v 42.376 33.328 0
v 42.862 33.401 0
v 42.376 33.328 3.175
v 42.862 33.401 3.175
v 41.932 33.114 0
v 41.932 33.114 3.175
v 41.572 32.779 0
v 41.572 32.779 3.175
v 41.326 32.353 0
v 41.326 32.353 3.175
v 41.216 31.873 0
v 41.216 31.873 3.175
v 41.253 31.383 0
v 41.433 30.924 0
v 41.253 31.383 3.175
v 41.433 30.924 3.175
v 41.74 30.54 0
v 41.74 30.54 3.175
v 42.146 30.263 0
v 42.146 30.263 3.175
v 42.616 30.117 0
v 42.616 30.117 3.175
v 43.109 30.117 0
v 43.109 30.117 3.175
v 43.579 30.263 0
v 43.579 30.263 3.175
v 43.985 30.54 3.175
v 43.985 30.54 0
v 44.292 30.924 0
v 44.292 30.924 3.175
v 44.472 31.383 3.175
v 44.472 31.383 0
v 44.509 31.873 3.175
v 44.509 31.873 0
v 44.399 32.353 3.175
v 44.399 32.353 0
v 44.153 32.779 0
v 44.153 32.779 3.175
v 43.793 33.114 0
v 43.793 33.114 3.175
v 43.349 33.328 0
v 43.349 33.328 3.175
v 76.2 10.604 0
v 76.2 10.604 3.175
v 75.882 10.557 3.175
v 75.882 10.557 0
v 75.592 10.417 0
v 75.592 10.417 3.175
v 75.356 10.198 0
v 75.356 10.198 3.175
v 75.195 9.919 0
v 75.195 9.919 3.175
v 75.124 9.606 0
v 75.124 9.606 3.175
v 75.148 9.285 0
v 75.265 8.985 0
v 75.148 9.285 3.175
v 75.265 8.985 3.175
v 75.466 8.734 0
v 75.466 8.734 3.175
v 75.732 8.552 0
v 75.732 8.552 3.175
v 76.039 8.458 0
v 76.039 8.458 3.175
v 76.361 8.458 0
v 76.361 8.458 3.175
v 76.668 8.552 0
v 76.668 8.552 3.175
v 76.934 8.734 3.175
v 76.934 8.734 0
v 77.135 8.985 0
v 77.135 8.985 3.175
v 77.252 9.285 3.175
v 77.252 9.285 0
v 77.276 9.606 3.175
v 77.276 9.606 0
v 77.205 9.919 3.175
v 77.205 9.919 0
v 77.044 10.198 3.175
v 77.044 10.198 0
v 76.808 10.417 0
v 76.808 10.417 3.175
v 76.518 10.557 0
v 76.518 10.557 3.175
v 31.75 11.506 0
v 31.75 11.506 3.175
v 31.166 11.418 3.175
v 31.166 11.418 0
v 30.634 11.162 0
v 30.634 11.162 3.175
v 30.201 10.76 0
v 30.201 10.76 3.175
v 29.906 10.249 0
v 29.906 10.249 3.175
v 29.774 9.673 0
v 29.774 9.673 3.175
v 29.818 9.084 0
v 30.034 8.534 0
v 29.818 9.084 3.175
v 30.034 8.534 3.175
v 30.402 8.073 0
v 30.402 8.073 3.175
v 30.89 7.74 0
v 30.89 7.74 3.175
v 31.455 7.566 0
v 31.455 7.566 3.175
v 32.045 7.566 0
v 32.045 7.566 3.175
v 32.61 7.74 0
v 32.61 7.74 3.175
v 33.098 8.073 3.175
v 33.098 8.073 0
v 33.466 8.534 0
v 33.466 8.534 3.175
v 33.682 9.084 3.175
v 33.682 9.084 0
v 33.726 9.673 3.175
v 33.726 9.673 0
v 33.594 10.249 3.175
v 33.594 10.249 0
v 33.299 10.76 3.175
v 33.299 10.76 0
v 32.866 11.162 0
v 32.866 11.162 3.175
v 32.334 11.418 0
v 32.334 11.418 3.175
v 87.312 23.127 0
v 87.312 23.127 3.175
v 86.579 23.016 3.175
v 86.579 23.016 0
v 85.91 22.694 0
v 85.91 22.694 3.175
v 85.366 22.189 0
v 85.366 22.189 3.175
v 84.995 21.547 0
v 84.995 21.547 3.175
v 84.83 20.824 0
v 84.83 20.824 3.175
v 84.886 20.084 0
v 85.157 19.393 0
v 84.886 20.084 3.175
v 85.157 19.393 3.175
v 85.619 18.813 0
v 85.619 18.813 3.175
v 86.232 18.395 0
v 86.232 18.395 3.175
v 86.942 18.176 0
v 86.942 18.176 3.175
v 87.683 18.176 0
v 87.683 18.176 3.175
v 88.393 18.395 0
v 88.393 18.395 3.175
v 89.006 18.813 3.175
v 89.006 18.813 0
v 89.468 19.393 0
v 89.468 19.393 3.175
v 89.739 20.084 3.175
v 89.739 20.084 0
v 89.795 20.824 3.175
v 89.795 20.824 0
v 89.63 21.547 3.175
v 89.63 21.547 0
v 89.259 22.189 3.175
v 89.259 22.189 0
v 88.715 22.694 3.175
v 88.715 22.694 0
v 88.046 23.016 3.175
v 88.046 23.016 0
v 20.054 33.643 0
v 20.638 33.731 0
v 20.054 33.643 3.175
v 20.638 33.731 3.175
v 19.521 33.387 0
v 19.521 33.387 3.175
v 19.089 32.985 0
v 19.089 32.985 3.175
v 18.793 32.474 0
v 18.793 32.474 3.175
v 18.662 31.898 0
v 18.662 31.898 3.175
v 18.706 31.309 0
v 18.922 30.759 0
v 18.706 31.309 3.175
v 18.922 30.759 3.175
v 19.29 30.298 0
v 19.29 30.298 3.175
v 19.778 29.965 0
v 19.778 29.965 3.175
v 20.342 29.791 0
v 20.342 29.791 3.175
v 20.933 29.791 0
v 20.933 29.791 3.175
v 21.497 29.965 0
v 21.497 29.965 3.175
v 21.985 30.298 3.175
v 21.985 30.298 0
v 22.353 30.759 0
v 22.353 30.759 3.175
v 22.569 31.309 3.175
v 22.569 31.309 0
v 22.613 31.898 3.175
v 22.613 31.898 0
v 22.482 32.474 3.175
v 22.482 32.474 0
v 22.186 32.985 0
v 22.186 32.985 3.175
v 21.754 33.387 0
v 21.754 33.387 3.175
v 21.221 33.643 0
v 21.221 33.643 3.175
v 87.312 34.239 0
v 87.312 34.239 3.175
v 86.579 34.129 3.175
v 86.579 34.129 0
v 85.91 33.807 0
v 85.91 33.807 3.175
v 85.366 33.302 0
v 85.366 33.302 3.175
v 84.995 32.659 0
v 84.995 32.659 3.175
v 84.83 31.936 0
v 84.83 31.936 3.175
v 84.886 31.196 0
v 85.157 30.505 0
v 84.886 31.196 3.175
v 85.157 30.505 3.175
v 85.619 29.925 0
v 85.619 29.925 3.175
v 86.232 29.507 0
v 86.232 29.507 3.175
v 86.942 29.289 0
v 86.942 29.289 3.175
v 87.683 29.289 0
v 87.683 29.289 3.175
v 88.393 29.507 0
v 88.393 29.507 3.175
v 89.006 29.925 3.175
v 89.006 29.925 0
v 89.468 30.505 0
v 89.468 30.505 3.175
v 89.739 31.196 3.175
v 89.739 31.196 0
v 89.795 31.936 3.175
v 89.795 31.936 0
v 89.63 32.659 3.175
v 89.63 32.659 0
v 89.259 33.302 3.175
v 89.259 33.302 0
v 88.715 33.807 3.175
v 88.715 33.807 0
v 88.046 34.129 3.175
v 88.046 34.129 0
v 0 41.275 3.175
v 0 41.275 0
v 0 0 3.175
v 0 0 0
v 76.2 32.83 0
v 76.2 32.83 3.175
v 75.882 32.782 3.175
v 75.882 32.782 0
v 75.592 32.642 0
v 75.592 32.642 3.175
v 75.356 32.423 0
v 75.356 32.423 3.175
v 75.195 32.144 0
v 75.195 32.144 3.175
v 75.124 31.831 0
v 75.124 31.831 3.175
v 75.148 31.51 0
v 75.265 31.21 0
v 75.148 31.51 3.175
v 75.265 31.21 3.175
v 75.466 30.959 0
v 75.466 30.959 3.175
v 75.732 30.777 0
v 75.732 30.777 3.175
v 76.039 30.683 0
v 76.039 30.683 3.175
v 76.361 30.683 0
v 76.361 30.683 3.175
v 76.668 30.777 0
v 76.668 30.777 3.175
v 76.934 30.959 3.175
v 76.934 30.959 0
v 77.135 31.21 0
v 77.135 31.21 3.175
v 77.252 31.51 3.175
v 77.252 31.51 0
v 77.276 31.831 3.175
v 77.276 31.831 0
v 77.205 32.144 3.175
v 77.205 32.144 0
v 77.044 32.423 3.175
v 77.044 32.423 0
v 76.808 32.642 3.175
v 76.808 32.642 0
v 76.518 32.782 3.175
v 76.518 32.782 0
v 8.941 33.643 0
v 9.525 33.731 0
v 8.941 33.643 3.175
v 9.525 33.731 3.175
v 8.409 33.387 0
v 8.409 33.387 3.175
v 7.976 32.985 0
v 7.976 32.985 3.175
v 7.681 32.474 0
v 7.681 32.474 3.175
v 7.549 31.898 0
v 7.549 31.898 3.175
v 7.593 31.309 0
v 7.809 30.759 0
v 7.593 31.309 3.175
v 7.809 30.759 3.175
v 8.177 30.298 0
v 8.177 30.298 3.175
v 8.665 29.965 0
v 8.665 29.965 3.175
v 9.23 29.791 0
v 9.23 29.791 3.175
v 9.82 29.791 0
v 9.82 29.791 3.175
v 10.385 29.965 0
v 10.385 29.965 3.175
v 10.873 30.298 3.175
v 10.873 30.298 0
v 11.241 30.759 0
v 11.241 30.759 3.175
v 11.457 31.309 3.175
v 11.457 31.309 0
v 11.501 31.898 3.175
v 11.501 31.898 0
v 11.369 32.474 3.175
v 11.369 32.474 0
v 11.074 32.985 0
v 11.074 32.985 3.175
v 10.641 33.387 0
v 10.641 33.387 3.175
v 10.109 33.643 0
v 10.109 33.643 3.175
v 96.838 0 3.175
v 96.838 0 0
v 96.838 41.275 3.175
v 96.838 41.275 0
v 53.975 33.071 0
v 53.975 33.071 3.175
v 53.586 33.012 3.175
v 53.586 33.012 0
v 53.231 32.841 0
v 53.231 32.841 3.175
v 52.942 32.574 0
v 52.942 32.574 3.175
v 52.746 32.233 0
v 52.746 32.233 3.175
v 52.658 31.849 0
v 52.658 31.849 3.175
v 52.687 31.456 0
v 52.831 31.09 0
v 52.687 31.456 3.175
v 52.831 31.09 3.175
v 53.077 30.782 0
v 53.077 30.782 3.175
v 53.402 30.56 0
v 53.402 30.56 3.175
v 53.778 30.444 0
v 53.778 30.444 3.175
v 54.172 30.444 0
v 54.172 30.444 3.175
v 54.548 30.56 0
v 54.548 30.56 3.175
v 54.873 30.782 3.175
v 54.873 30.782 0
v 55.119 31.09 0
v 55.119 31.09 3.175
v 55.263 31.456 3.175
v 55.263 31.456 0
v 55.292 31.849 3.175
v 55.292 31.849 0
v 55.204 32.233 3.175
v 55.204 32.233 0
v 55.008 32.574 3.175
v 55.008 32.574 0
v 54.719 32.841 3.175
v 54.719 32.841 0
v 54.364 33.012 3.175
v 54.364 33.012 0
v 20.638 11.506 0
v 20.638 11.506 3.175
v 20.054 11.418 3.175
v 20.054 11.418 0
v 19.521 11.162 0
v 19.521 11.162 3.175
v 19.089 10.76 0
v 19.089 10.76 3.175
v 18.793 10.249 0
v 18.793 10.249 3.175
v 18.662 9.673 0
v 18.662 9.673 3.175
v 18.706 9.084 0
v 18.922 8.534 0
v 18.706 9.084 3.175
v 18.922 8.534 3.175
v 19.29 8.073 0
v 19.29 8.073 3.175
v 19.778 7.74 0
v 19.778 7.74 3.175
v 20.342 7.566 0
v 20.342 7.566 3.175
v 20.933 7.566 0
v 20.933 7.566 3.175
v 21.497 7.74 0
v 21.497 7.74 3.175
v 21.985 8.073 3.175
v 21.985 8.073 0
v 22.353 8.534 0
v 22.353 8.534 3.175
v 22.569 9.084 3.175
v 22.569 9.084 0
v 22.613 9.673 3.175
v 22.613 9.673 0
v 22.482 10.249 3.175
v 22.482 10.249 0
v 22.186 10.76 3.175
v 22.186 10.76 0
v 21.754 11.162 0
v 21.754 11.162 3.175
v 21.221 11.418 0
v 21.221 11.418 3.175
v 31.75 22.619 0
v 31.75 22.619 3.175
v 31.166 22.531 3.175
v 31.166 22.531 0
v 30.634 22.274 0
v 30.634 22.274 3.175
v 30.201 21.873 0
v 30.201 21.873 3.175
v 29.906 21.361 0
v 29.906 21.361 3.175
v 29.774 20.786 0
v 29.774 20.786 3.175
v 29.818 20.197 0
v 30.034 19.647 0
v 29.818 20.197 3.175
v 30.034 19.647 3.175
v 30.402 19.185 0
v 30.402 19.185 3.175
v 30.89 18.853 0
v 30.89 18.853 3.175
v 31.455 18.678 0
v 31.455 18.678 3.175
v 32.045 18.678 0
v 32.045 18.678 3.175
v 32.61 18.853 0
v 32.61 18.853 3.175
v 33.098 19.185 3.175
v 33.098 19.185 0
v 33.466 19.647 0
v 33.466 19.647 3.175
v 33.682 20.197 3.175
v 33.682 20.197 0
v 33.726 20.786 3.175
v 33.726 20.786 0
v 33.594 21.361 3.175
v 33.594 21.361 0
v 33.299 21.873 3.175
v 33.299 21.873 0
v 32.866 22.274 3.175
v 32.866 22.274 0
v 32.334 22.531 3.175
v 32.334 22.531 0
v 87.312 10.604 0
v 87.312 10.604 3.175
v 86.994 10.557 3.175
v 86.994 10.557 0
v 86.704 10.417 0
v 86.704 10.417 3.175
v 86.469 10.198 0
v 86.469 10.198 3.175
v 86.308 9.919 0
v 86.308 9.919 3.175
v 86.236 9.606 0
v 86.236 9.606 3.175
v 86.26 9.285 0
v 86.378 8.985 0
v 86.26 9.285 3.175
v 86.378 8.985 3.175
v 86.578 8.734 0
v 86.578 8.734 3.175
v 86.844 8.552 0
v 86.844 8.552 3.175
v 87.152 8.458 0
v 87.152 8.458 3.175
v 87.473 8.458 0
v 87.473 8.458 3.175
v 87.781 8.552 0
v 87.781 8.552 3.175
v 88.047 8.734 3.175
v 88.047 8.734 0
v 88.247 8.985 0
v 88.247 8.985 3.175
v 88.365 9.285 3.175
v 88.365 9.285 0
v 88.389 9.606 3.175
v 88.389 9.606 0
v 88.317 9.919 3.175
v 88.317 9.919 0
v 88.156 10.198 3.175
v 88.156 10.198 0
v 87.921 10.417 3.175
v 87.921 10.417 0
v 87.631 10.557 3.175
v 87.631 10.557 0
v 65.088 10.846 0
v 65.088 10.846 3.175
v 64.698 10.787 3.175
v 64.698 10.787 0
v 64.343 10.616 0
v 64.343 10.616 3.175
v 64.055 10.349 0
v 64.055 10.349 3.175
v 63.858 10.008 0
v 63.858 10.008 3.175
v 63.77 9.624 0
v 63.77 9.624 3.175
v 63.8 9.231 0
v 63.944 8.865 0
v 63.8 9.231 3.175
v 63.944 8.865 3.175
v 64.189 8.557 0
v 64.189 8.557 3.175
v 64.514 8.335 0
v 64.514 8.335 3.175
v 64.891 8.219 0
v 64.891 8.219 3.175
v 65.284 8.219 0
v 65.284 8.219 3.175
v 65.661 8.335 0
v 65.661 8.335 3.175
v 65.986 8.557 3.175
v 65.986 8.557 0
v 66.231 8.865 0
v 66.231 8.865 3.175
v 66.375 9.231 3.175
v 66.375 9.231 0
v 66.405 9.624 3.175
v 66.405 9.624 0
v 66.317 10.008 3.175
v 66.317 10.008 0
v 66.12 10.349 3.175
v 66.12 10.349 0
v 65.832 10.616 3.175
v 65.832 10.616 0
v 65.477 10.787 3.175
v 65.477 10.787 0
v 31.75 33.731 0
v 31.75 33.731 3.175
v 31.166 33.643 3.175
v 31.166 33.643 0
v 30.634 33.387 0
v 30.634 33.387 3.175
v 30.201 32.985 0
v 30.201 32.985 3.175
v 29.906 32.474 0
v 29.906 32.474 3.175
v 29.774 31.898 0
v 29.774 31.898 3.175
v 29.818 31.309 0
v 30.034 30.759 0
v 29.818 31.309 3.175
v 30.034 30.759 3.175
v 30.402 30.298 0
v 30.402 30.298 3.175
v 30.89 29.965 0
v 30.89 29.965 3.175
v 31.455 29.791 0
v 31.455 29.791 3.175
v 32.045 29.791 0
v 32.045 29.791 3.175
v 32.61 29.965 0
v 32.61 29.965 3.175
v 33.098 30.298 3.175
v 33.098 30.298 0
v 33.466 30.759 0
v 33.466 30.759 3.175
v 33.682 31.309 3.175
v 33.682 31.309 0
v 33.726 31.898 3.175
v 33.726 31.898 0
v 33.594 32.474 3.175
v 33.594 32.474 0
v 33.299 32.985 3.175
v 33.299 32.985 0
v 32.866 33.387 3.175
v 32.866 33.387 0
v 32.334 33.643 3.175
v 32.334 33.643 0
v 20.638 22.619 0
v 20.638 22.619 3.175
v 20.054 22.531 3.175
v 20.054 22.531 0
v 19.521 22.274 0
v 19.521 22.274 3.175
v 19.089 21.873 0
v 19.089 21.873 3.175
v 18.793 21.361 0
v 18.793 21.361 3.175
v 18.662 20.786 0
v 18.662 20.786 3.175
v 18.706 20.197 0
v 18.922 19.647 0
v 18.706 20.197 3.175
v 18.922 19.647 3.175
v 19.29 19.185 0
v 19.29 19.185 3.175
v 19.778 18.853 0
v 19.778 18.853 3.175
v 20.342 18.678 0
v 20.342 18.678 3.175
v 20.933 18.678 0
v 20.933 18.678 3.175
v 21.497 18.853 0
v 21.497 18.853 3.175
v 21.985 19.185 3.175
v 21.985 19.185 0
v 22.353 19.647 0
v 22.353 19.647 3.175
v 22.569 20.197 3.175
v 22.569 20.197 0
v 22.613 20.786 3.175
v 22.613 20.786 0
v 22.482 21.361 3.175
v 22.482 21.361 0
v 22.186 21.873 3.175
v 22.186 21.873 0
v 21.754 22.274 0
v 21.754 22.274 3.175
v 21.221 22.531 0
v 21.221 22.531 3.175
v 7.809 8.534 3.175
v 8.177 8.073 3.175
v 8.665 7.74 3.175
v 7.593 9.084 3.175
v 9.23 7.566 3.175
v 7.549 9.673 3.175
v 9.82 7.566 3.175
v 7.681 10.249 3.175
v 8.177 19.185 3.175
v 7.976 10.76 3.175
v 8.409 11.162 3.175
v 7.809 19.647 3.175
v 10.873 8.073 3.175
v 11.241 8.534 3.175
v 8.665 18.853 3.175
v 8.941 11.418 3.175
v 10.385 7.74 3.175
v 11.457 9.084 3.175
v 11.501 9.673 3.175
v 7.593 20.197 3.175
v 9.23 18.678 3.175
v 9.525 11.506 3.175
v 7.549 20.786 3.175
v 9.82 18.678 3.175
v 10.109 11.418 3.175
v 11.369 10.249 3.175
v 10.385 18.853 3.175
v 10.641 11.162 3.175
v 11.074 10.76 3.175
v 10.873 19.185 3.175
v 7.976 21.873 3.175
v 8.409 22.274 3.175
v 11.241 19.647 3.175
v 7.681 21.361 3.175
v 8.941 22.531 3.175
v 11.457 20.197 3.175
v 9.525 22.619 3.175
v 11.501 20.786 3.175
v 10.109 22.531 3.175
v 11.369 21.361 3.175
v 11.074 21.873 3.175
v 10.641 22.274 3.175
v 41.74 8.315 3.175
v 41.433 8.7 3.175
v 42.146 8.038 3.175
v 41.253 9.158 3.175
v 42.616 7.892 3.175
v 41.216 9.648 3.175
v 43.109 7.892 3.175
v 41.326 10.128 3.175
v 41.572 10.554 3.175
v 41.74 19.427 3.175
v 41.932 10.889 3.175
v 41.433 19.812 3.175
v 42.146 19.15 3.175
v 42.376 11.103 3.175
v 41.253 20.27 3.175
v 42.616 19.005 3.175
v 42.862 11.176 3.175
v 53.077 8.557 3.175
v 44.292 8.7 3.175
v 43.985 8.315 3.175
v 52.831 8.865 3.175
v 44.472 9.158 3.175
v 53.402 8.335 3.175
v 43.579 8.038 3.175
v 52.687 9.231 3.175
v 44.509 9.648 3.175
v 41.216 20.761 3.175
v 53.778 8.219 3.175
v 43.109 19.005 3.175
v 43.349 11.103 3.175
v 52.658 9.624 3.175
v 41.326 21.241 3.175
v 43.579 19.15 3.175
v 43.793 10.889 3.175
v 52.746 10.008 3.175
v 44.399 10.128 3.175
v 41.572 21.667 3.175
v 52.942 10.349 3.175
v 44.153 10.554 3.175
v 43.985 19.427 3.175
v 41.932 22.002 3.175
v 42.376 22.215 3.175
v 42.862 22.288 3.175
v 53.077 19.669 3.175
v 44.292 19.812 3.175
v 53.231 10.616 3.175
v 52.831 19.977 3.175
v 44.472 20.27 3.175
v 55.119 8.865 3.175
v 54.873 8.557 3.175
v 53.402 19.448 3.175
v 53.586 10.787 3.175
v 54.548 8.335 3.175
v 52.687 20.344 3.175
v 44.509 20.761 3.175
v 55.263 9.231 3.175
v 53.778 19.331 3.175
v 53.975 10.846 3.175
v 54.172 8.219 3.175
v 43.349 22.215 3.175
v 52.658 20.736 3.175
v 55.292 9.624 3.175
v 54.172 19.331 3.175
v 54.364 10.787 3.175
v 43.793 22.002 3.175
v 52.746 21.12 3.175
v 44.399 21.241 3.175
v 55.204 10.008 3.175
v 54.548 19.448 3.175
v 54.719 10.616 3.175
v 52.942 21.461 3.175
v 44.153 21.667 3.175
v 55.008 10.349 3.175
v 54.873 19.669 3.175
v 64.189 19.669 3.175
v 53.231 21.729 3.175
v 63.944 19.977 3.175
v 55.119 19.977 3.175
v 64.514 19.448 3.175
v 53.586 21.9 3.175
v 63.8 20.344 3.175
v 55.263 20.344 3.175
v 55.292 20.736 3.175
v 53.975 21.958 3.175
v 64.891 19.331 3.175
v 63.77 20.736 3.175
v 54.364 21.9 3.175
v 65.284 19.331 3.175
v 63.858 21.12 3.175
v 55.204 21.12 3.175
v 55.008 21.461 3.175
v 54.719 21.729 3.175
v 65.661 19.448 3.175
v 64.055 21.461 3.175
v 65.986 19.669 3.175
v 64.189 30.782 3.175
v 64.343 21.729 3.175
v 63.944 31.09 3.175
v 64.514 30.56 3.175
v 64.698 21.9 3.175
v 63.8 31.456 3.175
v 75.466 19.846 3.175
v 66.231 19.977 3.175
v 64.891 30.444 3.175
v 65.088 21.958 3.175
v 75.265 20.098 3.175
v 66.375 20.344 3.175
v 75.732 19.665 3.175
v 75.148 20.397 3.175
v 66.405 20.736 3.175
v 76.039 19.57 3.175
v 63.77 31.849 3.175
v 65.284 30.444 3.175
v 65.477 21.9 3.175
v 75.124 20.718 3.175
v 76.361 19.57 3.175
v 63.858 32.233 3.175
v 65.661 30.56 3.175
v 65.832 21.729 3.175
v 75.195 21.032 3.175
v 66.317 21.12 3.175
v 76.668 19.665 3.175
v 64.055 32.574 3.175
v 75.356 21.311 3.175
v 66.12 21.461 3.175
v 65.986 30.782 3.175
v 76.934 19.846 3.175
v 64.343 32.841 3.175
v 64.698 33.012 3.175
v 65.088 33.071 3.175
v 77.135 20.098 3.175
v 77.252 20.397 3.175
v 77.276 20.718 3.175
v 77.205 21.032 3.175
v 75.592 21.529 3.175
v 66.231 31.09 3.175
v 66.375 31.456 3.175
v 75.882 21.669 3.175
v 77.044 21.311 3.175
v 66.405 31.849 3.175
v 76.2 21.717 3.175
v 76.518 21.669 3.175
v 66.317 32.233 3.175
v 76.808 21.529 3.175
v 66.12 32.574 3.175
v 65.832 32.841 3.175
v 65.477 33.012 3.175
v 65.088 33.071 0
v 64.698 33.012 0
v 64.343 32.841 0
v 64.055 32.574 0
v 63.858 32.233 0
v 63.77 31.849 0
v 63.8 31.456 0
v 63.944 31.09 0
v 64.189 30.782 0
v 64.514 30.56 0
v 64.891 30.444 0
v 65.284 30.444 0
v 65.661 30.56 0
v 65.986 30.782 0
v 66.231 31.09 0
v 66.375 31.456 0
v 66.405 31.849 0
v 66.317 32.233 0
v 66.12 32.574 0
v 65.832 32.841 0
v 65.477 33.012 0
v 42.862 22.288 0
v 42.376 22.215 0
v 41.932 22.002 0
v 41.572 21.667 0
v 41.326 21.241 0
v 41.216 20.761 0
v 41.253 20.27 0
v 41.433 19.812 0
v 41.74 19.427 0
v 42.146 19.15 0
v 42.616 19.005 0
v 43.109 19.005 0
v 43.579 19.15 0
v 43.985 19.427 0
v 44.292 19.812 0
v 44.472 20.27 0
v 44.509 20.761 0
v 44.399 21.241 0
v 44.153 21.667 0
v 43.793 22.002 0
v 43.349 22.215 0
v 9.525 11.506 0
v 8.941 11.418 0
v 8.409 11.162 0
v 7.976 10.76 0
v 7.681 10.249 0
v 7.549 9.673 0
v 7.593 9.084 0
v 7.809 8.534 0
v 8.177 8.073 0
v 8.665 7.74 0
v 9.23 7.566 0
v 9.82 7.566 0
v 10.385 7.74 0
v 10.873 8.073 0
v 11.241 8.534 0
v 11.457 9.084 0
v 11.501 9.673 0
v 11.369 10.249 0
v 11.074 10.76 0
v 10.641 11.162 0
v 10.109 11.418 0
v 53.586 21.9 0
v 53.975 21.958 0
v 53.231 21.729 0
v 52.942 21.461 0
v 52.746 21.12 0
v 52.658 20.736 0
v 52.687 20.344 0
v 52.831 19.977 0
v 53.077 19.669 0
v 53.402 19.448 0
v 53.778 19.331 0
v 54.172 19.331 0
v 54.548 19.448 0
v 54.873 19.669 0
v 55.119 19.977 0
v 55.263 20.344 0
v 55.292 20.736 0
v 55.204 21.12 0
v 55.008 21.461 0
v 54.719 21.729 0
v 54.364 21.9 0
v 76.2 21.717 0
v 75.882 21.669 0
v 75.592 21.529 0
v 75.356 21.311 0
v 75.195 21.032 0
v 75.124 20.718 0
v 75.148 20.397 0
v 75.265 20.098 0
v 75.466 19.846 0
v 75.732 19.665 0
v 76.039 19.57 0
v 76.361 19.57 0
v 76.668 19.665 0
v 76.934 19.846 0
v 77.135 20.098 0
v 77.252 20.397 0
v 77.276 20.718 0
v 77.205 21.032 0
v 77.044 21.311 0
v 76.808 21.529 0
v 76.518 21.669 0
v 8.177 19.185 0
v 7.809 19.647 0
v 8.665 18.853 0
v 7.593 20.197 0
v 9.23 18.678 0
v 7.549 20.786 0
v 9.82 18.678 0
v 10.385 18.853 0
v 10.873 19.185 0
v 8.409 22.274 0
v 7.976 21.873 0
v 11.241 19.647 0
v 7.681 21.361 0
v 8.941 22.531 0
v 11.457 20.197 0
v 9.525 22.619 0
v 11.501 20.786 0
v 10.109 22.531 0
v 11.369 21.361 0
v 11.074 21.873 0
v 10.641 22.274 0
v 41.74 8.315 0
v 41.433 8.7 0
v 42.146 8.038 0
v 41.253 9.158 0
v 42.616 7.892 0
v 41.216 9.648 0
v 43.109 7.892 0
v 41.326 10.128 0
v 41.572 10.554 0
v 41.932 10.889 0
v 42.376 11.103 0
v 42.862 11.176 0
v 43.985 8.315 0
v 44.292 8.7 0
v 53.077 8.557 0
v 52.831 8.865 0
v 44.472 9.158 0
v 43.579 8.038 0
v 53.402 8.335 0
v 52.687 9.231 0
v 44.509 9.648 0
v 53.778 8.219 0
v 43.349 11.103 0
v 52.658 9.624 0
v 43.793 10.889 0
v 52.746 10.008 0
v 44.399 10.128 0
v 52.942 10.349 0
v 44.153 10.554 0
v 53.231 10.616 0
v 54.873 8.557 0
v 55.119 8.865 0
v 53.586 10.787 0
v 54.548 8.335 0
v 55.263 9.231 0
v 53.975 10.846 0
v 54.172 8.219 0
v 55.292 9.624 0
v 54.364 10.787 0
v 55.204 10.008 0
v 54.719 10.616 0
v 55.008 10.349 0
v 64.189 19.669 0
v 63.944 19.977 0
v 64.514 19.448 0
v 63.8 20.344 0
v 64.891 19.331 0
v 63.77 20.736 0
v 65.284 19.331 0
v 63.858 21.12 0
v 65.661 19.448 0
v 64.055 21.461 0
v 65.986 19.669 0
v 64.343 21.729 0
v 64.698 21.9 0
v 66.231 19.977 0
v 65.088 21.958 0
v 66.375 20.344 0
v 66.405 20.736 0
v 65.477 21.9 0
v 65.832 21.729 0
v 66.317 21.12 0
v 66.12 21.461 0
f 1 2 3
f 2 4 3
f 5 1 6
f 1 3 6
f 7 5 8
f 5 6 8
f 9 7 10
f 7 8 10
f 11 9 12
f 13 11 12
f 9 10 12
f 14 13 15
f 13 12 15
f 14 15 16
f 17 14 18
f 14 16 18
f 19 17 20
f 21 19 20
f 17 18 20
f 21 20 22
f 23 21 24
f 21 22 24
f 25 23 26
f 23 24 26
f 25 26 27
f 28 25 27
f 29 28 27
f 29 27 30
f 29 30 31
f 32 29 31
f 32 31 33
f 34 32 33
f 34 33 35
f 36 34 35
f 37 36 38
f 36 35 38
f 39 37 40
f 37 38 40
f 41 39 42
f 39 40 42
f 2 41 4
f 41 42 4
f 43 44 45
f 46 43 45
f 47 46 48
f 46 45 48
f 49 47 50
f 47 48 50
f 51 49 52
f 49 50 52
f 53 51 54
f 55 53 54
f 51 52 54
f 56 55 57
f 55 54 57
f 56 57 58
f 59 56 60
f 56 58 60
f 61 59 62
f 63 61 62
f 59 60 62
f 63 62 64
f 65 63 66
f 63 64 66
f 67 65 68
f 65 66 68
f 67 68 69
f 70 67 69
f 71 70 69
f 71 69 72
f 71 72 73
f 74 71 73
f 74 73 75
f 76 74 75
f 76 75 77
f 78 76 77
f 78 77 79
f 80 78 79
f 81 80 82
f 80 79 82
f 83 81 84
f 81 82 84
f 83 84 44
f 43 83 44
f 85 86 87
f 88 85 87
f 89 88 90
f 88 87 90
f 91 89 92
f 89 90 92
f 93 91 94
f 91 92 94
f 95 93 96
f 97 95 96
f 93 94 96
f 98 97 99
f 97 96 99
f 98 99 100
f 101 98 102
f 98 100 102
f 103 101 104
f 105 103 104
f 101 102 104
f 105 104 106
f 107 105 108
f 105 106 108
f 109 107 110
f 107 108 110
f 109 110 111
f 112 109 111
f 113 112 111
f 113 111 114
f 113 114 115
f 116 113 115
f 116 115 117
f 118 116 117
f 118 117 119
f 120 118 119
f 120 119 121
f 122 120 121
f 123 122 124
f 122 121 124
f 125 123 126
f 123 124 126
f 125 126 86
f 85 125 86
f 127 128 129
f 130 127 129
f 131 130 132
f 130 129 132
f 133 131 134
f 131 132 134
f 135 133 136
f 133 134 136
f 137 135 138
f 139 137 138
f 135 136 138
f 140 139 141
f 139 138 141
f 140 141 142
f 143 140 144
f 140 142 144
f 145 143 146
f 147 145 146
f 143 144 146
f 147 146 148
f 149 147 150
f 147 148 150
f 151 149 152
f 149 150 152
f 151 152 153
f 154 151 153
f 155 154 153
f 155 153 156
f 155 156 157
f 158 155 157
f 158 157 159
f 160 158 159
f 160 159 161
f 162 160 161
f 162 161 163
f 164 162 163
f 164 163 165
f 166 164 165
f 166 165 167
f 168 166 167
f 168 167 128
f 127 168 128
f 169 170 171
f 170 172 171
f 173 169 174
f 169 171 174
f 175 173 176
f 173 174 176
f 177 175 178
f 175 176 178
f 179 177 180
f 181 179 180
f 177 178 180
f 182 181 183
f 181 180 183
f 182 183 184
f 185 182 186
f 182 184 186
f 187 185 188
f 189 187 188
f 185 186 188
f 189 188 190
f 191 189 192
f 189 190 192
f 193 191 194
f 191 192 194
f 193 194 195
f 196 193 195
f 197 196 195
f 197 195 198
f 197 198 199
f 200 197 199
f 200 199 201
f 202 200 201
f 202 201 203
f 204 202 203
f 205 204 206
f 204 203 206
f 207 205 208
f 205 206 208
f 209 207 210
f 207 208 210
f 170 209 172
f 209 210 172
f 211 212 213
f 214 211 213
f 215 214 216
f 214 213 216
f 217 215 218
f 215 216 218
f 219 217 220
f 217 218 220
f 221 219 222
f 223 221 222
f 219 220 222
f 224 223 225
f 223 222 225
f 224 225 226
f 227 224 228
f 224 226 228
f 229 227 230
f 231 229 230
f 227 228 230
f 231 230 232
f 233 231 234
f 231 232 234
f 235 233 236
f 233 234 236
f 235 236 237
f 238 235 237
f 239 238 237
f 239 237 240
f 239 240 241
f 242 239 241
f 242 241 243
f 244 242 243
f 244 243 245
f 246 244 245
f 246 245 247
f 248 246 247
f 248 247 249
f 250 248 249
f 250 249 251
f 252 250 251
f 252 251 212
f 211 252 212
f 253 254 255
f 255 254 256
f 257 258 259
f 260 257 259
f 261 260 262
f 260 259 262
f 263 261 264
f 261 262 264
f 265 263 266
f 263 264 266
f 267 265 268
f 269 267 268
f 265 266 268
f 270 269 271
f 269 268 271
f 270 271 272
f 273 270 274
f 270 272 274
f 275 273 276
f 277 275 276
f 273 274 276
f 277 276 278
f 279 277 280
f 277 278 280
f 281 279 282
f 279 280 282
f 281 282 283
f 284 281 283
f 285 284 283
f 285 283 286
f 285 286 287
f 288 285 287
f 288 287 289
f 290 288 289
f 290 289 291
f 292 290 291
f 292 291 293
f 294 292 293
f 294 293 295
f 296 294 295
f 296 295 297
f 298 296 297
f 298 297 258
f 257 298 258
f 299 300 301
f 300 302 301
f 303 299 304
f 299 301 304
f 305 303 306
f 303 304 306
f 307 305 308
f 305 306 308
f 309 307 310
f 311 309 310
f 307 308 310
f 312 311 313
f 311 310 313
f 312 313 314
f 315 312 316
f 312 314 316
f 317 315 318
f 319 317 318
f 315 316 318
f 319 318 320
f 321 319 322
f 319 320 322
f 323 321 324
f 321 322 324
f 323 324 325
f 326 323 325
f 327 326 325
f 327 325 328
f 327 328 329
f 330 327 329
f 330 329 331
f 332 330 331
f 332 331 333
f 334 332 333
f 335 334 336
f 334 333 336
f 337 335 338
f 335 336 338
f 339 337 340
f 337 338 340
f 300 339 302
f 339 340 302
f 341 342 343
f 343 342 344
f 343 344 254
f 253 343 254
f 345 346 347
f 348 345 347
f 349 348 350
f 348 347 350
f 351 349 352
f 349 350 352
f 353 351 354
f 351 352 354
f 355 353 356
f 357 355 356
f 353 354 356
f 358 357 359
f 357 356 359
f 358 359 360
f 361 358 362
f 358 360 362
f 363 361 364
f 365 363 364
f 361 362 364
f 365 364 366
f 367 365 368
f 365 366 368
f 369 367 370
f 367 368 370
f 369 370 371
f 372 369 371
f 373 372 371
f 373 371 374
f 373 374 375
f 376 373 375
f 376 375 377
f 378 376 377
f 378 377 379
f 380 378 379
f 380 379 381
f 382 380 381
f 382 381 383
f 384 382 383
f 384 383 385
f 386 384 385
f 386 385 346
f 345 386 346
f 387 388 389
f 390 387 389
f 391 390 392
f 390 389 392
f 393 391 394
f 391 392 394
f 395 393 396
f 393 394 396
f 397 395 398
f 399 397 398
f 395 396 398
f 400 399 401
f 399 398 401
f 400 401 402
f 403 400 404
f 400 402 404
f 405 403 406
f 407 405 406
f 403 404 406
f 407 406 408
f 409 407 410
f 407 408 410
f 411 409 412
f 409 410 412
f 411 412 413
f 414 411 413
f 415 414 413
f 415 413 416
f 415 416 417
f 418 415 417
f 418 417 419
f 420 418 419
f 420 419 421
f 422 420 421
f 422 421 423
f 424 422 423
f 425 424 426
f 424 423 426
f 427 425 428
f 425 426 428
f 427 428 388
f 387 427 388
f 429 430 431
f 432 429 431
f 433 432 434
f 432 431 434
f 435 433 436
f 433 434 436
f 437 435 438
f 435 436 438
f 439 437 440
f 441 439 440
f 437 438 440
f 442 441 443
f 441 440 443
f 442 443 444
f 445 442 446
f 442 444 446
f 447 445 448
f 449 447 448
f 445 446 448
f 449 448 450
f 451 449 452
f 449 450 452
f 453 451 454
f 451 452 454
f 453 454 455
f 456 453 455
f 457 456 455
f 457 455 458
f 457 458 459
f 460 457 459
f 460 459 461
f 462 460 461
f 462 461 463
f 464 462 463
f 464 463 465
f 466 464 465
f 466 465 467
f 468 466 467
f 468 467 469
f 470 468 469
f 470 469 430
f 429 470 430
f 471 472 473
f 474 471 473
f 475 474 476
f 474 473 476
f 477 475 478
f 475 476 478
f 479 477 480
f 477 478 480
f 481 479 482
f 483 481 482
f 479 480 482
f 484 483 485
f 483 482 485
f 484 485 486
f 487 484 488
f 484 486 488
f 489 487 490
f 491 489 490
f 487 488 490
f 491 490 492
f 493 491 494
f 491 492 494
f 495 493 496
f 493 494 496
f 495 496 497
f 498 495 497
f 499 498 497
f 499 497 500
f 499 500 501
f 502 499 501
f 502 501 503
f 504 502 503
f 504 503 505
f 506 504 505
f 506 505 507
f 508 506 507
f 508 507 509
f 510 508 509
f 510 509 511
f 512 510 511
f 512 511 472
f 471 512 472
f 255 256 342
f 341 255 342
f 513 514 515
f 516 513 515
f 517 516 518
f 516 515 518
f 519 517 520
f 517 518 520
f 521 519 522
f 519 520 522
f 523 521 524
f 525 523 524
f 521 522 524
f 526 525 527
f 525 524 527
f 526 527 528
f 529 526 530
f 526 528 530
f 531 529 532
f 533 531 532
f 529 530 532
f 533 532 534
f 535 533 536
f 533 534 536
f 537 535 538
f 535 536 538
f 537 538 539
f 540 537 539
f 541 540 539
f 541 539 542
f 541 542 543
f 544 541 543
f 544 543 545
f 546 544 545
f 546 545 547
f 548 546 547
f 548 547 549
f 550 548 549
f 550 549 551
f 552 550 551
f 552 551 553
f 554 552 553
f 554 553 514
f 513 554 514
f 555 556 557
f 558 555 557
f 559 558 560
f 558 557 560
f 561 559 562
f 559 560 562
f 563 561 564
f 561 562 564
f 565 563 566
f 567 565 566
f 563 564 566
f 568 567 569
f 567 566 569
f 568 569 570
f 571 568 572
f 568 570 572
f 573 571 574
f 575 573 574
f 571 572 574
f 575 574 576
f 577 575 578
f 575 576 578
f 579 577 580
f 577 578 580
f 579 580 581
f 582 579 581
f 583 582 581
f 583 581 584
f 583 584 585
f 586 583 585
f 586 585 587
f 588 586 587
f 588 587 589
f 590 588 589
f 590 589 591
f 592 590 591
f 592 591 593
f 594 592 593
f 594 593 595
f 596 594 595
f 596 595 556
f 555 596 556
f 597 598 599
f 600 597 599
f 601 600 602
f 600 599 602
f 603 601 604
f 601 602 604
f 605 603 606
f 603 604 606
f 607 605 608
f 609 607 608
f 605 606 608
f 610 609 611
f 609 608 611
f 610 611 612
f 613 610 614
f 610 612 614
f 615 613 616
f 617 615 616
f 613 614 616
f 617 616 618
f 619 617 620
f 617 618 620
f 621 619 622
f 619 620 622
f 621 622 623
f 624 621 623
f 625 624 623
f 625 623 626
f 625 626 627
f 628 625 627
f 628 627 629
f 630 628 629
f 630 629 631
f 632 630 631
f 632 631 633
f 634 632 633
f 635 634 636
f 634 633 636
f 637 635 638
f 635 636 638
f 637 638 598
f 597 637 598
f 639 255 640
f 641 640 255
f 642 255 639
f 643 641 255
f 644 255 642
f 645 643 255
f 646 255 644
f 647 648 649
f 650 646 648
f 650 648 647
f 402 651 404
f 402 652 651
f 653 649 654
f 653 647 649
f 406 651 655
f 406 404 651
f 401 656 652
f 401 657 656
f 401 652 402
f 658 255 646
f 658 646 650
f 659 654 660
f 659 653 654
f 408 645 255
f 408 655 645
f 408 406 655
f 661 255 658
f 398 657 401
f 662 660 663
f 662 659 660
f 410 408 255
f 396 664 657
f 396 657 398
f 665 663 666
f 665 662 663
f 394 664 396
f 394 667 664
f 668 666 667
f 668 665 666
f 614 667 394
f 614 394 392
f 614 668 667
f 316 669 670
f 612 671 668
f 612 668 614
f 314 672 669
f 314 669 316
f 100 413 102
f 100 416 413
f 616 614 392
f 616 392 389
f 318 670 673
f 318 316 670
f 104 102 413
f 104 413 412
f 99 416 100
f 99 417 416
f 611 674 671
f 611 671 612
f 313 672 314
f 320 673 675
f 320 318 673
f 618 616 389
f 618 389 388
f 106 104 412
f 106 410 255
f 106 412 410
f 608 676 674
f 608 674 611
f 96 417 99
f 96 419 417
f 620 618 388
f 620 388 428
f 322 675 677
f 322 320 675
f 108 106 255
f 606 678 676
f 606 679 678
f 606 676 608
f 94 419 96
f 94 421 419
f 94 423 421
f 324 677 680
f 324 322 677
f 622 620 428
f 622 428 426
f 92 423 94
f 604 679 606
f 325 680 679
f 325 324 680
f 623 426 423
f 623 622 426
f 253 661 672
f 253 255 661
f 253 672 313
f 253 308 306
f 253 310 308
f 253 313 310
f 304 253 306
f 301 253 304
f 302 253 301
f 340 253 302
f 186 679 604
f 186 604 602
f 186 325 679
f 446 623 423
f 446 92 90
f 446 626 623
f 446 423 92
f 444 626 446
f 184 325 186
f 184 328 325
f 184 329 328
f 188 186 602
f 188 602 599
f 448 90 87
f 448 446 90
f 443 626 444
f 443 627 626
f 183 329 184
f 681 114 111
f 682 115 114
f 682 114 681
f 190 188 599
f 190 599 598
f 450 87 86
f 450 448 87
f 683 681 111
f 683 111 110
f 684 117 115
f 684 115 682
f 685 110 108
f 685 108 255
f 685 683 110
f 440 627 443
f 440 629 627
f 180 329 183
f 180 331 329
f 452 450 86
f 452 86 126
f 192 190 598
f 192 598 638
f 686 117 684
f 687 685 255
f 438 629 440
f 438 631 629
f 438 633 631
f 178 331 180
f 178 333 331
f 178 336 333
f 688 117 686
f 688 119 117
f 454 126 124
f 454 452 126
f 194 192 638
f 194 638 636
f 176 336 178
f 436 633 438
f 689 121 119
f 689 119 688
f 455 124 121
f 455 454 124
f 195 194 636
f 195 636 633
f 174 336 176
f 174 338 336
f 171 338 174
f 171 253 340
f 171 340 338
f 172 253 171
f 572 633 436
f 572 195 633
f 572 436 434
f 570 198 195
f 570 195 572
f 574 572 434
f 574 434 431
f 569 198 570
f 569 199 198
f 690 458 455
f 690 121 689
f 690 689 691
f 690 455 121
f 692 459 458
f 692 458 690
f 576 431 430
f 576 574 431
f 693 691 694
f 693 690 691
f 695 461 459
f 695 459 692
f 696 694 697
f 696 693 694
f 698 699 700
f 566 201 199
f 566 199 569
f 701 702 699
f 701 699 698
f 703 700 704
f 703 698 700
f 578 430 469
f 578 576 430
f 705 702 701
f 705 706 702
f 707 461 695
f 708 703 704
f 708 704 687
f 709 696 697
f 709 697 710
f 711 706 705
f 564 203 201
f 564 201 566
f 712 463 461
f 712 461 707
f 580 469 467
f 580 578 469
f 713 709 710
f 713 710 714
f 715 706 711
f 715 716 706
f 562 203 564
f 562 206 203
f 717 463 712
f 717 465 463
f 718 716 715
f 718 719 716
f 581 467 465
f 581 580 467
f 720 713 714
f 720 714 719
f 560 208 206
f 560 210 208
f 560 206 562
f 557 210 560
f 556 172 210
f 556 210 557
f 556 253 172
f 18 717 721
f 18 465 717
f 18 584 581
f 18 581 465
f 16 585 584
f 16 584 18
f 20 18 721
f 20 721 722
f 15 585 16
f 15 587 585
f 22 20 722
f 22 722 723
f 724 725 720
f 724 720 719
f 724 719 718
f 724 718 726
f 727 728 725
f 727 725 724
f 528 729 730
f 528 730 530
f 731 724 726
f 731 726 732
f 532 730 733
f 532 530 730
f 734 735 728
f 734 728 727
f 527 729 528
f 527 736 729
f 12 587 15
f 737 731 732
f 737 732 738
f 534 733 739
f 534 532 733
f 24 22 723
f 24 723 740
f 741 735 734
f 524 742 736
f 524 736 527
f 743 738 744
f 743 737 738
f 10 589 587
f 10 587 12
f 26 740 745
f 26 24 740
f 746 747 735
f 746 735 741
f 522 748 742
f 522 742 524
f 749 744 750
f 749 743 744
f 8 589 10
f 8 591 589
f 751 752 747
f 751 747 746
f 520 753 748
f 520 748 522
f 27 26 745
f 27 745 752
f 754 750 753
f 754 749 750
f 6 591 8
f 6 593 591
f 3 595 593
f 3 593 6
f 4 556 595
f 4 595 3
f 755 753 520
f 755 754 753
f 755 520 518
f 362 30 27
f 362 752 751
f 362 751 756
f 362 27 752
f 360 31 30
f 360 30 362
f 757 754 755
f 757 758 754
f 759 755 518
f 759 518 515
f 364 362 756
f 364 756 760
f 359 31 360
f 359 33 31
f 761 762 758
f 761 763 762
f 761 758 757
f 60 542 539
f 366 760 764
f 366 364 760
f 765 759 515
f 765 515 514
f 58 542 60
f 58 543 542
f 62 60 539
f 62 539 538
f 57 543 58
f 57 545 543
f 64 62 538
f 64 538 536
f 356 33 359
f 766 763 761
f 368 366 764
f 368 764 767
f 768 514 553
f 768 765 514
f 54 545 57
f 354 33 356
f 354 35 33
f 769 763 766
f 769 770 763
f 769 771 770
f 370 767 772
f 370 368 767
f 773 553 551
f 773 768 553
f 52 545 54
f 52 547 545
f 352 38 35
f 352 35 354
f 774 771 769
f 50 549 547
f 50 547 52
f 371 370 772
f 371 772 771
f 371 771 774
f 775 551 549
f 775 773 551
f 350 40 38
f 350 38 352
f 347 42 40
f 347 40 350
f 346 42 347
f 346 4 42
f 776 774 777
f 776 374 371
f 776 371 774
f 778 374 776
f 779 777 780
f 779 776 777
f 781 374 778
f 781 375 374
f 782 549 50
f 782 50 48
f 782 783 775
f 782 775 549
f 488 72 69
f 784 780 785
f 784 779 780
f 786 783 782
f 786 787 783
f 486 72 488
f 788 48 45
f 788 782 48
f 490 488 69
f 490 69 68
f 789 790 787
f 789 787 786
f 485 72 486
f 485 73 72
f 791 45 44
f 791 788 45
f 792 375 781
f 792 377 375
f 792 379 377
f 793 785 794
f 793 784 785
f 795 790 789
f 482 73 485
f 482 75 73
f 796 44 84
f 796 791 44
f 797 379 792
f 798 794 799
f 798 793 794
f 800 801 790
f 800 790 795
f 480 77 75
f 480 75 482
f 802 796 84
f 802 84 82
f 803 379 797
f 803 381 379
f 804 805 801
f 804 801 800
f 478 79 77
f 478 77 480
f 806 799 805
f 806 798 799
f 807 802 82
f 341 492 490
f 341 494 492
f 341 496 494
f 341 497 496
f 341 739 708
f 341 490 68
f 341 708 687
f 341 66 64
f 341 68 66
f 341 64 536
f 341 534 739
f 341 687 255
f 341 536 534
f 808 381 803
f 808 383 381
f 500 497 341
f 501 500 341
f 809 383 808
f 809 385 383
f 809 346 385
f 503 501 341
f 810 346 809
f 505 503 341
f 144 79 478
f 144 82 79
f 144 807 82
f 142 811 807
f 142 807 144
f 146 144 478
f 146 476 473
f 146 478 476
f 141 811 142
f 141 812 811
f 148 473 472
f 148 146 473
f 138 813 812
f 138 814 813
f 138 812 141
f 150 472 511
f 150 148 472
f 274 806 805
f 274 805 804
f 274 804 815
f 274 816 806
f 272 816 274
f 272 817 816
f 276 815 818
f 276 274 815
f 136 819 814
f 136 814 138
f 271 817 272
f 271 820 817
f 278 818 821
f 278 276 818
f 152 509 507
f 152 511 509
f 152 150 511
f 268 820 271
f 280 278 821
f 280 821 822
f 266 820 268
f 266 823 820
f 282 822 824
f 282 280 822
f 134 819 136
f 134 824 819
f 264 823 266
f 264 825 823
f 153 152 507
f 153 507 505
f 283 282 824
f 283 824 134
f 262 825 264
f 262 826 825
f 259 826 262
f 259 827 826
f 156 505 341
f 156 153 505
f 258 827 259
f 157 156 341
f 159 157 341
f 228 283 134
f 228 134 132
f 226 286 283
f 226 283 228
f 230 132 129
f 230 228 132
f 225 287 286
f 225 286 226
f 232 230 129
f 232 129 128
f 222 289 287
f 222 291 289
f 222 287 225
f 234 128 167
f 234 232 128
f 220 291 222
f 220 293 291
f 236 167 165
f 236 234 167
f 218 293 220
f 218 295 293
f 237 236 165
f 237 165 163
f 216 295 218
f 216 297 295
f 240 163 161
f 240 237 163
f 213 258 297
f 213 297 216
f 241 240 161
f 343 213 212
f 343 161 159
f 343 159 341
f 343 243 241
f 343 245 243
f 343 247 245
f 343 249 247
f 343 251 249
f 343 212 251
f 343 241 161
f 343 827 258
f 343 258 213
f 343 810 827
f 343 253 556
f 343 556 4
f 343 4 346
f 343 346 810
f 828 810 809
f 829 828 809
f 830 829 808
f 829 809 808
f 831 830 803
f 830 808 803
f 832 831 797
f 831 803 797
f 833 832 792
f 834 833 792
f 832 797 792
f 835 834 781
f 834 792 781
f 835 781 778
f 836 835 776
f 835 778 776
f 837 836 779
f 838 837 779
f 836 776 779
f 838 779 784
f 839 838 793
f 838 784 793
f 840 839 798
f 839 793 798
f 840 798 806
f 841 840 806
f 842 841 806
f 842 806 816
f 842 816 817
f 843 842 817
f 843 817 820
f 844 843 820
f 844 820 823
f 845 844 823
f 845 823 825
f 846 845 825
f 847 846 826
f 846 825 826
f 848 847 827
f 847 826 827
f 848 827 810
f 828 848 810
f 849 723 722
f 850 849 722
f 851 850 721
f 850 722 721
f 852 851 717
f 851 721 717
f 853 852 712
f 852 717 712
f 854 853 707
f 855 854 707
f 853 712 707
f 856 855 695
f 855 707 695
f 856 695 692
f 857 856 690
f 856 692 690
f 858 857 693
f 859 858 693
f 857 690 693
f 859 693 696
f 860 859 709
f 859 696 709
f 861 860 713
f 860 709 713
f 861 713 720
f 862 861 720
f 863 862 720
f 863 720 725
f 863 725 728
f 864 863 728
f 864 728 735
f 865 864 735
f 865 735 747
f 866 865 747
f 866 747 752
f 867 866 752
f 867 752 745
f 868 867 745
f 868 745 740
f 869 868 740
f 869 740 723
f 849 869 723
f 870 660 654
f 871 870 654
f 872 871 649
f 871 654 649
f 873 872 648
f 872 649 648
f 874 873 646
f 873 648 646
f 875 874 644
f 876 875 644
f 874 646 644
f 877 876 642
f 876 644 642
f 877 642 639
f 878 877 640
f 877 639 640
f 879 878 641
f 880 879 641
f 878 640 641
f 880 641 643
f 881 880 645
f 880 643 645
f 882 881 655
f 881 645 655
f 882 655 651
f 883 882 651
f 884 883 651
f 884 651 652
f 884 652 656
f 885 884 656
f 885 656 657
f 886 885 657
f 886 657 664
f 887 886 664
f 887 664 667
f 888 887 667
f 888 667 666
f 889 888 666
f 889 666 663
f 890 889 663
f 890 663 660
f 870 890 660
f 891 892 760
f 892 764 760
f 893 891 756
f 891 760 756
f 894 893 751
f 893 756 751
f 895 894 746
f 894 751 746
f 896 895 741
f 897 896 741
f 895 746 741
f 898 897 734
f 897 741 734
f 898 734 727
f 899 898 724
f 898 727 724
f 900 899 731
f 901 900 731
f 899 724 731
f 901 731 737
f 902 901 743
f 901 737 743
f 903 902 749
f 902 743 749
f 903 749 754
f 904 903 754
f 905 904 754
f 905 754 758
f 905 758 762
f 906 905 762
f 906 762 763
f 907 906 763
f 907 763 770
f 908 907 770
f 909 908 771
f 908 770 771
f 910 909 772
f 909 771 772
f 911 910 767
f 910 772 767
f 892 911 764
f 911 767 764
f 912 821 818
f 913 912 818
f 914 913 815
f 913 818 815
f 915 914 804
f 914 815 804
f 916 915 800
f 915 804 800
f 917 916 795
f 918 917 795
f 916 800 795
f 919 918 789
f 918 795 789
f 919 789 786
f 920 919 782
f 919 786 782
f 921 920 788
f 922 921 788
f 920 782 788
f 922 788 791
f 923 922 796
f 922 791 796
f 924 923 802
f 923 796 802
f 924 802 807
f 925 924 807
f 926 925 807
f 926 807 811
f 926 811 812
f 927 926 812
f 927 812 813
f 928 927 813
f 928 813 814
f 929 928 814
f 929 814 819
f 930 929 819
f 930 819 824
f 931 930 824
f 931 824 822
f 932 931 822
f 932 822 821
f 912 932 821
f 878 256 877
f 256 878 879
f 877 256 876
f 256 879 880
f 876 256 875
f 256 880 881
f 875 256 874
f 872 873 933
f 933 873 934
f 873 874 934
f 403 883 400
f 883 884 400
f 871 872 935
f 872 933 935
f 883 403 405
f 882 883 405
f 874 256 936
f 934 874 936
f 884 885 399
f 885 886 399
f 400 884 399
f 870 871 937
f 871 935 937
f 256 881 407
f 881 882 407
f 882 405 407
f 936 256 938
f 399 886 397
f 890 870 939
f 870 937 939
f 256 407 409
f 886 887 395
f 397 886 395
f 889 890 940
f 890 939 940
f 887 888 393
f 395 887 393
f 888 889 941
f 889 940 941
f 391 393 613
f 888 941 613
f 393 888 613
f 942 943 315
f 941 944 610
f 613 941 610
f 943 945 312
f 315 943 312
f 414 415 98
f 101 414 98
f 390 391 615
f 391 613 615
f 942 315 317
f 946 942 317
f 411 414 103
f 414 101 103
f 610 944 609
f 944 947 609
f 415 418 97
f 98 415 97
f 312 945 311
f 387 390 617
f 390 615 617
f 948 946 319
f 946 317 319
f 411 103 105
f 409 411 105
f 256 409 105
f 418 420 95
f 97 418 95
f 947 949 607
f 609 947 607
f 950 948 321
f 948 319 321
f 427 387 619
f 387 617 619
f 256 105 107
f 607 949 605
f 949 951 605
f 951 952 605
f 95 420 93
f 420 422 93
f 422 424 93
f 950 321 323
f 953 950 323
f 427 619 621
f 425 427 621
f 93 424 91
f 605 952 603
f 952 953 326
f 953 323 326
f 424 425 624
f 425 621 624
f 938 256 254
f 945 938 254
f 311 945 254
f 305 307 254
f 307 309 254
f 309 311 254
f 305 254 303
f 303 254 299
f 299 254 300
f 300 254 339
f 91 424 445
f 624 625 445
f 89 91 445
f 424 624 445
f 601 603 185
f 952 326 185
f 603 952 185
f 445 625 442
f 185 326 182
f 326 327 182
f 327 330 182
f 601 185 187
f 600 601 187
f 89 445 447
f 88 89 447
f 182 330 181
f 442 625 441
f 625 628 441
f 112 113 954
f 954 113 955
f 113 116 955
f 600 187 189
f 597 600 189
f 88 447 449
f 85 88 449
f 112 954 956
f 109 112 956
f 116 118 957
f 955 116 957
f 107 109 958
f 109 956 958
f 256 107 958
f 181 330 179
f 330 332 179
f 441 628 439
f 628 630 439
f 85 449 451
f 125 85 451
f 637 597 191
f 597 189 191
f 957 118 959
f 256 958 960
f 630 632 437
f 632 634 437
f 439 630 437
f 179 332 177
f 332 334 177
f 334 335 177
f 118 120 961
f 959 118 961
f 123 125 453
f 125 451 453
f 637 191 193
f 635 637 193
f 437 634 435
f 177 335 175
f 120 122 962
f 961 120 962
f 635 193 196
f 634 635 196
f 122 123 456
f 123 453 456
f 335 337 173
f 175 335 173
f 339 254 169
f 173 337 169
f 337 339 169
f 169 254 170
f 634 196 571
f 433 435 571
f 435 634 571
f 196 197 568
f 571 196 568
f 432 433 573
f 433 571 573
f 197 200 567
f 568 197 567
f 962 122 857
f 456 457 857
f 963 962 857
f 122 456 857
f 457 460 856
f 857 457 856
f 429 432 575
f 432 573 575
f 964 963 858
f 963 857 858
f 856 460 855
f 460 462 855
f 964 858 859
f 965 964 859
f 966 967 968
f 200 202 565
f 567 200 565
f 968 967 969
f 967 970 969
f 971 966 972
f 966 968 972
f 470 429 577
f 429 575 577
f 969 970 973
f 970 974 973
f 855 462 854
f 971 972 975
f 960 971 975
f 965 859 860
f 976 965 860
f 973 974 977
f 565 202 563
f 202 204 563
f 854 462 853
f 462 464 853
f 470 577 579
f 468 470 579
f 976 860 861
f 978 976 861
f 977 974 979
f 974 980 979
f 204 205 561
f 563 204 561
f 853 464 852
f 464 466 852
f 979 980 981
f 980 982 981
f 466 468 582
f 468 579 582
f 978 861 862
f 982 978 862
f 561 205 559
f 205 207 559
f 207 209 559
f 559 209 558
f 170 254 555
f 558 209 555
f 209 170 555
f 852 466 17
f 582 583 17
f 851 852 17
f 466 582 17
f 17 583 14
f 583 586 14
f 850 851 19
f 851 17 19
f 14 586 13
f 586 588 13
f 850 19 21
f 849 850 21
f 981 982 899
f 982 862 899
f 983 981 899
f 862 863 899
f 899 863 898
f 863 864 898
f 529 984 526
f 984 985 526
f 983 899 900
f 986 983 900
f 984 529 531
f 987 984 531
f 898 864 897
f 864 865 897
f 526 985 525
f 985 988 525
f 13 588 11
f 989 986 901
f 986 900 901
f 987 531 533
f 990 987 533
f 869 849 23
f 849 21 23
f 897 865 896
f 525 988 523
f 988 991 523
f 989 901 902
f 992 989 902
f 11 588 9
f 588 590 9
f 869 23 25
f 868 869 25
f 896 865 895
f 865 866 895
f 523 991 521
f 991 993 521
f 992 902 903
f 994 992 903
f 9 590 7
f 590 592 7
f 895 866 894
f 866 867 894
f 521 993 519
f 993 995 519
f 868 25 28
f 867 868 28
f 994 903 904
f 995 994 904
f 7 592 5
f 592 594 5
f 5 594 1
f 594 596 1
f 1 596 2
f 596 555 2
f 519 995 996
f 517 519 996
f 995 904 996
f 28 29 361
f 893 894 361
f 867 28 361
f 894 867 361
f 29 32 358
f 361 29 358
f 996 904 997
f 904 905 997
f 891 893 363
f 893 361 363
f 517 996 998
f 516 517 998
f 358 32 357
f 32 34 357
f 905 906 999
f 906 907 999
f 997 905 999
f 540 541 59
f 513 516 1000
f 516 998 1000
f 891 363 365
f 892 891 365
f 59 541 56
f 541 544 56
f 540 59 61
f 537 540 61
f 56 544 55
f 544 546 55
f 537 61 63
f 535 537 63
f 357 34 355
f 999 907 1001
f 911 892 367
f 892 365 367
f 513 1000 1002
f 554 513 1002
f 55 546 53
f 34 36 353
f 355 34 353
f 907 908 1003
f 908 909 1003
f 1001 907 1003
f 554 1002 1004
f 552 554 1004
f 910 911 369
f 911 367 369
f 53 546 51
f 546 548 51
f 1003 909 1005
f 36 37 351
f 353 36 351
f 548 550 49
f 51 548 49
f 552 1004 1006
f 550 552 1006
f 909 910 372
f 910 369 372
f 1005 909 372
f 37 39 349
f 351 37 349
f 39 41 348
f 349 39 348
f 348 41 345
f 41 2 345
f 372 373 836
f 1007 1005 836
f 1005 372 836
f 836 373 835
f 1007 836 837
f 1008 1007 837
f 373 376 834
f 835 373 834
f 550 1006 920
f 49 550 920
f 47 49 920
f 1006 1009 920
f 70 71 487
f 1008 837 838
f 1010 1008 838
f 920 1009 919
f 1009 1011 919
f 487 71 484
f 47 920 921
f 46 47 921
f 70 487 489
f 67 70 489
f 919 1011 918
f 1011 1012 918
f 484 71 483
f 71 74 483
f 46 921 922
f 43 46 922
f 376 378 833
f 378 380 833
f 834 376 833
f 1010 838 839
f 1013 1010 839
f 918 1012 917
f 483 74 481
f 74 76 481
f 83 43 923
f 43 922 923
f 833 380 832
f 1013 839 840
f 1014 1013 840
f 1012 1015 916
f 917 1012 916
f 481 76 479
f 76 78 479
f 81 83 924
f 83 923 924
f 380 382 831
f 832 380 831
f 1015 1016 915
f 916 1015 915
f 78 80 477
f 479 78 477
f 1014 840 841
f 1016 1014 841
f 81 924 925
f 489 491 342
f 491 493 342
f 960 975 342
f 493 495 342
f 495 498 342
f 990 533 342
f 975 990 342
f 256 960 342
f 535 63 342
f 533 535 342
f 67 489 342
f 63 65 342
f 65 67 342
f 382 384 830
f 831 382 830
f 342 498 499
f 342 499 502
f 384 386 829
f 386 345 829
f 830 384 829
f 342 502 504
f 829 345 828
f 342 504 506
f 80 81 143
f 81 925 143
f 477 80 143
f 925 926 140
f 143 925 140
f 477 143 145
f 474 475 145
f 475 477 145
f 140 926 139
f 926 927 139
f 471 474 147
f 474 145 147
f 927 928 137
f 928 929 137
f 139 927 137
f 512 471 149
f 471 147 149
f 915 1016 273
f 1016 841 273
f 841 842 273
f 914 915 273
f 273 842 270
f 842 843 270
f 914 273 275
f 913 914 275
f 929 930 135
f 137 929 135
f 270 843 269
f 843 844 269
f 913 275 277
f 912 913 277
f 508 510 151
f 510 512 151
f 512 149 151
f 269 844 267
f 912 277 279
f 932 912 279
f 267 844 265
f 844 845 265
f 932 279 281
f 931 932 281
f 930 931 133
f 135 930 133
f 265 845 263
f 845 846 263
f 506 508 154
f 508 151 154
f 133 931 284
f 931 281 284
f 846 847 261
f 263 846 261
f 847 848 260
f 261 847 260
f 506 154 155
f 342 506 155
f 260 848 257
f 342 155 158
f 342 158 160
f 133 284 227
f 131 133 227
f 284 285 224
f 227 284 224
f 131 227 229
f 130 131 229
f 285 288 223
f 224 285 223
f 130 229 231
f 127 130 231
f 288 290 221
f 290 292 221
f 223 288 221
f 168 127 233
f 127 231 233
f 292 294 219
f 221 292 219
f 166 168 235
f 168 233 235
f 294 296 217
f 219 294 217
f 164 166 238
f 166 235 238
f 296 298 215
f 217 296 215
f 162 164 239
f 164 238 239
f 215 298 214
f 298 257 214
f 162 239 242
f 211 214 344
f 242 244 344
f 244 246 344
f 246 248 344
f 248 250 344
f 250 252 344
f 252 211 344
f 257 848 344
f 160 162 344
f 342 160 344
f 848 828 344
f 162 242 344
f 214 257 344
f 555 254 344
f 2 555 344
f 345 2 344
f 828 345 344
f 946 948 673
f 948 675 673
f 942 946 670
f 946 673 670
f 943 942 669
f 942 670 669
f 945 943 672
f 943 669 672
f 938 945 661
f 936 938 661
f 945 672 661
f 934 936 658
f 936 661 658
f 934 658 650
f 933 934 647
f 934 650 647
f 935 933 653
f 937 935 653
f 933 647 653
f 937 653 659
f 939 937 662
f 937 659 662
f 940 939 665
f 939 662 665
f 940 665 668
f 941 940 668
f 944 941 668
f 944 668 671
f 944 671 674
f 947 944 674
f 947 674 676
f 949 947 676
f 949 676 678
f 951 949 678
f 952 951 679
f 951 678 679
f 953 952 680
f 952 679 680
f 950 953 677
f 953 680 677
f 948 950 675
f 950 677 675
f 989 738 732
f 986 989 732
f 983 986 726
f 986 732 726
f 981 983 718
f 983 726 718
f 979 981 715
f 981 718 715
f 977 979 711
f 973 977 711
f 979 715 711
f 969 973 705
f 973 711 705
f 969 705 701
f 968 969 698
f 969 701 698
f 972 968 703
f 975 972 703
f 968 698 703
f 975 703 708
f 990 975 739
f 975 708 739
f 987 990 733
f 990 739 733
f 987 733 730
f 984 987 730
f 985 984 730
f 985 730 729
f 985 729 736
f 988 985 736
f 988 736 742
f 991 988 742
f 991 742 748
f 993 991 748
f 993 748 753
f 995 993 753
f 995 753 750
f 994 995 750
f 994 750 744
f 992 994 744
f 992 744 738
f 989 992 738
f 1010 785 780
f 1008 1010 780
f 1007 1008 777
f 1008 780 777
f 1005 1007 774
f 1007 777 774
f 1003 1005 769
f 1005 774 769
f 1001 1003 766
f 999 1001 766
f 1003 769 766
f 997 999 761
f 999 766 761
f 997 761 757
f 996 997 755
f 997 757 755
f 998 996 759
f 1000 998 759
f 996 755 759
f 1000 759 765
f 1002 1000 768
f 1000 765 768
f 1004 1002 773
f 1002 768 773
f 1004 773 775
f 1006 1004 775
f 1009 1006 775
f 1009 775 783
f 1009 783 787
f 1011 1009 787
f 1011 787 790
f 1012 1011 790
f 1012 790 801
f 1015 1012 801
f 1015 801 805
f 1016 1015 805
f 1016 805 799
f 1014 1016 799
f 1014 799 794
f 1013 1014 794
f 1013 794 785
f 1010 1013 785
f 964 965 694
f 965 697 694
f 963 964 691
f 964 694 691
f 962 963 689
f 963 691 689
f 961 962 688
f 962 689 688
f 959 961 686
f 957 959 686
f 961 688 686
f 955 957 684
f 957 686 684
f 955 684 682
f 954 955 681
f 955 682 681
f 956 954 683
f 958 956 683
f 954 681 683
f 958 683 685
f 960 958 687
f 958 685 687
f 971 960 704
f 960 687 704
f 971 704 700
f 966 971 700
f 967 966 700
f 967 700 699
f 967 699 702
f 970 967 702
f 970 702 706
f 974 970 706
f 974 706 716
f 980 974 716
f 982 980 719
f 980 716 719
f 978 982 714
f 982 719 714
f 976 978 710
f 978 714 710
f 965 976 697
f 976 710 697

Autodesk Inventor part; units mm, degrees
ref_plane "YZ Plane" through (0, 0, 0) normal (1, 0, 0) x (0, 1, 0)
ref_plane "XZ Plane" through (0, 0, 0) normal (0, 1, 0) x (-1, 0, 0)
ref_plane "XY Plane" through (0, 0, 0) normal (0, 0, 1) x (1, 0, 0)
sketch "Sketch1" plane through (0, 0, 0) normal (0, 0, 1) x (1, 0, 0)
  line L0 (0, 0) -> (96.8375, 0)
  line L1 (96.8375, 0) -> (96.8375, 41.275)
  line L2 (96.8375, 41.275) -> (0, 41.275)
  line L3 (0, 41.275) -> (0, 0)
  circle A0 centre (87.3125, 31.75) radius 7.112
  circle A1 centre (76.2, 31.75) radius 2.3241
  circle A2 centre (65.0875, 31.75) radius 3.3274
  circle A3 centre (42.8625, 31.75) radius 3.9624
  circle A4 centre (31.75, 31.75) radius 3.9624
  point P0 (9.525, 9.525)
  point P1 (9.525, 20.6375)
  point P2 (9.525, 31.75)
  point P3 (20.6375, 9.525)
  point P4 (20.6375, 20.6375)
  point P5 (20.6375, 31.75)
  point P6 (31.75, 9.525)
  point P7 (31.75, 20.6375)
  point P8 (42.8625, 9.525)
  point P9 (42.8625, 20.6375)
  point P10 (53.975, 9.525)
  point P11 (53.975, 20.6375)
  point P12 (53.975, 31.75)
  point P13 (65.0875, 9.525)
  point P14 (65.0875, 20.6375)
  point P15 (76.2, 9.525)
  point P16 (76.2, 20.6375)
  point P17 (87.3125, 9.525)
  point P18 (87.3125, 20.6375)
  dimension "d0" = 9.525
  dimension "d2" = 9.525
  dimension "d5" = 11.1125
  dimension "d8" = 11.1125
  dimension "d11" = 9.525
  dimension "d12" = 9.525
  dimension "d50" = 14.224
  dimension "d51" = 4.6482
  dimension "d52" = 6.6548
  dimension "d53" = 7.9248
  dimension "d54" = 7.9248
extrude "Extrusion1" add sketch "Sketch1" along normal blind 3.175 contours L3 L2 L1 L0 | A0 | A1 | A2 | A3 | A4
hole "10-32" at (9.525, 9.525, 0) at (9.525, 20.6375, 0) at (9.525, 31.75, 0) at (20.6375, 9.525, 0) at (20.6375, 20.6375, 0) at (20.6375, 31.75, 0) at (31.75, 9.525, 0) at (31.75, 20.6375, 0) at (31.75, 31.75, 0) direction (0, 0, 1) diameter 3.9624 end through all thread size "10-32 UNF" class "2B" standard "ANSI Unified Screw Threads"
hole "8-32" at (42.8625, 31.75, 0) at (42.8625, 20.6375, 0) at (42.8625, 9.525, 0) direction (0, 0, 1) diameter 3.302 end through all thread size "8-32 UNC" class "2B" standard "ANSI Unified Screw Threads"
hole "6-32" at (53.975, 9.525, 0) at (53.975, 20.6375, 0) at (53.975, 31.75, 0) at (65.0875, 9.525, 0) at (65.0875, 20.6375, 0) at (65.0875, 31.75, 0) direction (0, 0, 1) diameter 2.6416 end through all thread size "6-32 UNC" class "2B" standard "ANSI Unified Screw Threads"
hole "4-40" at (76.2, 9.525, 0) at (76.2, 20.6375, 0) at (76.2, 31.75, 0) at (87.3125, 9.525, 0) direction (0, 0, 1) diameter 2.159 end through all
hole "1/4-20" at (87.3125, 20.6375, 0) at (87.3125, 31.75, 0) direction (0, 0, 1) diameter 4.9784 end through all thread size "1/4-20 UNC" class "2B" standard "ANSI Unified Screw Threads"
equation "\"d2\" = d0"
equation "\"d5\" = d8"
equation "\"d11\" = d2"
equation "\"d12\" = d0"
properties part number "Bolt Holder"
